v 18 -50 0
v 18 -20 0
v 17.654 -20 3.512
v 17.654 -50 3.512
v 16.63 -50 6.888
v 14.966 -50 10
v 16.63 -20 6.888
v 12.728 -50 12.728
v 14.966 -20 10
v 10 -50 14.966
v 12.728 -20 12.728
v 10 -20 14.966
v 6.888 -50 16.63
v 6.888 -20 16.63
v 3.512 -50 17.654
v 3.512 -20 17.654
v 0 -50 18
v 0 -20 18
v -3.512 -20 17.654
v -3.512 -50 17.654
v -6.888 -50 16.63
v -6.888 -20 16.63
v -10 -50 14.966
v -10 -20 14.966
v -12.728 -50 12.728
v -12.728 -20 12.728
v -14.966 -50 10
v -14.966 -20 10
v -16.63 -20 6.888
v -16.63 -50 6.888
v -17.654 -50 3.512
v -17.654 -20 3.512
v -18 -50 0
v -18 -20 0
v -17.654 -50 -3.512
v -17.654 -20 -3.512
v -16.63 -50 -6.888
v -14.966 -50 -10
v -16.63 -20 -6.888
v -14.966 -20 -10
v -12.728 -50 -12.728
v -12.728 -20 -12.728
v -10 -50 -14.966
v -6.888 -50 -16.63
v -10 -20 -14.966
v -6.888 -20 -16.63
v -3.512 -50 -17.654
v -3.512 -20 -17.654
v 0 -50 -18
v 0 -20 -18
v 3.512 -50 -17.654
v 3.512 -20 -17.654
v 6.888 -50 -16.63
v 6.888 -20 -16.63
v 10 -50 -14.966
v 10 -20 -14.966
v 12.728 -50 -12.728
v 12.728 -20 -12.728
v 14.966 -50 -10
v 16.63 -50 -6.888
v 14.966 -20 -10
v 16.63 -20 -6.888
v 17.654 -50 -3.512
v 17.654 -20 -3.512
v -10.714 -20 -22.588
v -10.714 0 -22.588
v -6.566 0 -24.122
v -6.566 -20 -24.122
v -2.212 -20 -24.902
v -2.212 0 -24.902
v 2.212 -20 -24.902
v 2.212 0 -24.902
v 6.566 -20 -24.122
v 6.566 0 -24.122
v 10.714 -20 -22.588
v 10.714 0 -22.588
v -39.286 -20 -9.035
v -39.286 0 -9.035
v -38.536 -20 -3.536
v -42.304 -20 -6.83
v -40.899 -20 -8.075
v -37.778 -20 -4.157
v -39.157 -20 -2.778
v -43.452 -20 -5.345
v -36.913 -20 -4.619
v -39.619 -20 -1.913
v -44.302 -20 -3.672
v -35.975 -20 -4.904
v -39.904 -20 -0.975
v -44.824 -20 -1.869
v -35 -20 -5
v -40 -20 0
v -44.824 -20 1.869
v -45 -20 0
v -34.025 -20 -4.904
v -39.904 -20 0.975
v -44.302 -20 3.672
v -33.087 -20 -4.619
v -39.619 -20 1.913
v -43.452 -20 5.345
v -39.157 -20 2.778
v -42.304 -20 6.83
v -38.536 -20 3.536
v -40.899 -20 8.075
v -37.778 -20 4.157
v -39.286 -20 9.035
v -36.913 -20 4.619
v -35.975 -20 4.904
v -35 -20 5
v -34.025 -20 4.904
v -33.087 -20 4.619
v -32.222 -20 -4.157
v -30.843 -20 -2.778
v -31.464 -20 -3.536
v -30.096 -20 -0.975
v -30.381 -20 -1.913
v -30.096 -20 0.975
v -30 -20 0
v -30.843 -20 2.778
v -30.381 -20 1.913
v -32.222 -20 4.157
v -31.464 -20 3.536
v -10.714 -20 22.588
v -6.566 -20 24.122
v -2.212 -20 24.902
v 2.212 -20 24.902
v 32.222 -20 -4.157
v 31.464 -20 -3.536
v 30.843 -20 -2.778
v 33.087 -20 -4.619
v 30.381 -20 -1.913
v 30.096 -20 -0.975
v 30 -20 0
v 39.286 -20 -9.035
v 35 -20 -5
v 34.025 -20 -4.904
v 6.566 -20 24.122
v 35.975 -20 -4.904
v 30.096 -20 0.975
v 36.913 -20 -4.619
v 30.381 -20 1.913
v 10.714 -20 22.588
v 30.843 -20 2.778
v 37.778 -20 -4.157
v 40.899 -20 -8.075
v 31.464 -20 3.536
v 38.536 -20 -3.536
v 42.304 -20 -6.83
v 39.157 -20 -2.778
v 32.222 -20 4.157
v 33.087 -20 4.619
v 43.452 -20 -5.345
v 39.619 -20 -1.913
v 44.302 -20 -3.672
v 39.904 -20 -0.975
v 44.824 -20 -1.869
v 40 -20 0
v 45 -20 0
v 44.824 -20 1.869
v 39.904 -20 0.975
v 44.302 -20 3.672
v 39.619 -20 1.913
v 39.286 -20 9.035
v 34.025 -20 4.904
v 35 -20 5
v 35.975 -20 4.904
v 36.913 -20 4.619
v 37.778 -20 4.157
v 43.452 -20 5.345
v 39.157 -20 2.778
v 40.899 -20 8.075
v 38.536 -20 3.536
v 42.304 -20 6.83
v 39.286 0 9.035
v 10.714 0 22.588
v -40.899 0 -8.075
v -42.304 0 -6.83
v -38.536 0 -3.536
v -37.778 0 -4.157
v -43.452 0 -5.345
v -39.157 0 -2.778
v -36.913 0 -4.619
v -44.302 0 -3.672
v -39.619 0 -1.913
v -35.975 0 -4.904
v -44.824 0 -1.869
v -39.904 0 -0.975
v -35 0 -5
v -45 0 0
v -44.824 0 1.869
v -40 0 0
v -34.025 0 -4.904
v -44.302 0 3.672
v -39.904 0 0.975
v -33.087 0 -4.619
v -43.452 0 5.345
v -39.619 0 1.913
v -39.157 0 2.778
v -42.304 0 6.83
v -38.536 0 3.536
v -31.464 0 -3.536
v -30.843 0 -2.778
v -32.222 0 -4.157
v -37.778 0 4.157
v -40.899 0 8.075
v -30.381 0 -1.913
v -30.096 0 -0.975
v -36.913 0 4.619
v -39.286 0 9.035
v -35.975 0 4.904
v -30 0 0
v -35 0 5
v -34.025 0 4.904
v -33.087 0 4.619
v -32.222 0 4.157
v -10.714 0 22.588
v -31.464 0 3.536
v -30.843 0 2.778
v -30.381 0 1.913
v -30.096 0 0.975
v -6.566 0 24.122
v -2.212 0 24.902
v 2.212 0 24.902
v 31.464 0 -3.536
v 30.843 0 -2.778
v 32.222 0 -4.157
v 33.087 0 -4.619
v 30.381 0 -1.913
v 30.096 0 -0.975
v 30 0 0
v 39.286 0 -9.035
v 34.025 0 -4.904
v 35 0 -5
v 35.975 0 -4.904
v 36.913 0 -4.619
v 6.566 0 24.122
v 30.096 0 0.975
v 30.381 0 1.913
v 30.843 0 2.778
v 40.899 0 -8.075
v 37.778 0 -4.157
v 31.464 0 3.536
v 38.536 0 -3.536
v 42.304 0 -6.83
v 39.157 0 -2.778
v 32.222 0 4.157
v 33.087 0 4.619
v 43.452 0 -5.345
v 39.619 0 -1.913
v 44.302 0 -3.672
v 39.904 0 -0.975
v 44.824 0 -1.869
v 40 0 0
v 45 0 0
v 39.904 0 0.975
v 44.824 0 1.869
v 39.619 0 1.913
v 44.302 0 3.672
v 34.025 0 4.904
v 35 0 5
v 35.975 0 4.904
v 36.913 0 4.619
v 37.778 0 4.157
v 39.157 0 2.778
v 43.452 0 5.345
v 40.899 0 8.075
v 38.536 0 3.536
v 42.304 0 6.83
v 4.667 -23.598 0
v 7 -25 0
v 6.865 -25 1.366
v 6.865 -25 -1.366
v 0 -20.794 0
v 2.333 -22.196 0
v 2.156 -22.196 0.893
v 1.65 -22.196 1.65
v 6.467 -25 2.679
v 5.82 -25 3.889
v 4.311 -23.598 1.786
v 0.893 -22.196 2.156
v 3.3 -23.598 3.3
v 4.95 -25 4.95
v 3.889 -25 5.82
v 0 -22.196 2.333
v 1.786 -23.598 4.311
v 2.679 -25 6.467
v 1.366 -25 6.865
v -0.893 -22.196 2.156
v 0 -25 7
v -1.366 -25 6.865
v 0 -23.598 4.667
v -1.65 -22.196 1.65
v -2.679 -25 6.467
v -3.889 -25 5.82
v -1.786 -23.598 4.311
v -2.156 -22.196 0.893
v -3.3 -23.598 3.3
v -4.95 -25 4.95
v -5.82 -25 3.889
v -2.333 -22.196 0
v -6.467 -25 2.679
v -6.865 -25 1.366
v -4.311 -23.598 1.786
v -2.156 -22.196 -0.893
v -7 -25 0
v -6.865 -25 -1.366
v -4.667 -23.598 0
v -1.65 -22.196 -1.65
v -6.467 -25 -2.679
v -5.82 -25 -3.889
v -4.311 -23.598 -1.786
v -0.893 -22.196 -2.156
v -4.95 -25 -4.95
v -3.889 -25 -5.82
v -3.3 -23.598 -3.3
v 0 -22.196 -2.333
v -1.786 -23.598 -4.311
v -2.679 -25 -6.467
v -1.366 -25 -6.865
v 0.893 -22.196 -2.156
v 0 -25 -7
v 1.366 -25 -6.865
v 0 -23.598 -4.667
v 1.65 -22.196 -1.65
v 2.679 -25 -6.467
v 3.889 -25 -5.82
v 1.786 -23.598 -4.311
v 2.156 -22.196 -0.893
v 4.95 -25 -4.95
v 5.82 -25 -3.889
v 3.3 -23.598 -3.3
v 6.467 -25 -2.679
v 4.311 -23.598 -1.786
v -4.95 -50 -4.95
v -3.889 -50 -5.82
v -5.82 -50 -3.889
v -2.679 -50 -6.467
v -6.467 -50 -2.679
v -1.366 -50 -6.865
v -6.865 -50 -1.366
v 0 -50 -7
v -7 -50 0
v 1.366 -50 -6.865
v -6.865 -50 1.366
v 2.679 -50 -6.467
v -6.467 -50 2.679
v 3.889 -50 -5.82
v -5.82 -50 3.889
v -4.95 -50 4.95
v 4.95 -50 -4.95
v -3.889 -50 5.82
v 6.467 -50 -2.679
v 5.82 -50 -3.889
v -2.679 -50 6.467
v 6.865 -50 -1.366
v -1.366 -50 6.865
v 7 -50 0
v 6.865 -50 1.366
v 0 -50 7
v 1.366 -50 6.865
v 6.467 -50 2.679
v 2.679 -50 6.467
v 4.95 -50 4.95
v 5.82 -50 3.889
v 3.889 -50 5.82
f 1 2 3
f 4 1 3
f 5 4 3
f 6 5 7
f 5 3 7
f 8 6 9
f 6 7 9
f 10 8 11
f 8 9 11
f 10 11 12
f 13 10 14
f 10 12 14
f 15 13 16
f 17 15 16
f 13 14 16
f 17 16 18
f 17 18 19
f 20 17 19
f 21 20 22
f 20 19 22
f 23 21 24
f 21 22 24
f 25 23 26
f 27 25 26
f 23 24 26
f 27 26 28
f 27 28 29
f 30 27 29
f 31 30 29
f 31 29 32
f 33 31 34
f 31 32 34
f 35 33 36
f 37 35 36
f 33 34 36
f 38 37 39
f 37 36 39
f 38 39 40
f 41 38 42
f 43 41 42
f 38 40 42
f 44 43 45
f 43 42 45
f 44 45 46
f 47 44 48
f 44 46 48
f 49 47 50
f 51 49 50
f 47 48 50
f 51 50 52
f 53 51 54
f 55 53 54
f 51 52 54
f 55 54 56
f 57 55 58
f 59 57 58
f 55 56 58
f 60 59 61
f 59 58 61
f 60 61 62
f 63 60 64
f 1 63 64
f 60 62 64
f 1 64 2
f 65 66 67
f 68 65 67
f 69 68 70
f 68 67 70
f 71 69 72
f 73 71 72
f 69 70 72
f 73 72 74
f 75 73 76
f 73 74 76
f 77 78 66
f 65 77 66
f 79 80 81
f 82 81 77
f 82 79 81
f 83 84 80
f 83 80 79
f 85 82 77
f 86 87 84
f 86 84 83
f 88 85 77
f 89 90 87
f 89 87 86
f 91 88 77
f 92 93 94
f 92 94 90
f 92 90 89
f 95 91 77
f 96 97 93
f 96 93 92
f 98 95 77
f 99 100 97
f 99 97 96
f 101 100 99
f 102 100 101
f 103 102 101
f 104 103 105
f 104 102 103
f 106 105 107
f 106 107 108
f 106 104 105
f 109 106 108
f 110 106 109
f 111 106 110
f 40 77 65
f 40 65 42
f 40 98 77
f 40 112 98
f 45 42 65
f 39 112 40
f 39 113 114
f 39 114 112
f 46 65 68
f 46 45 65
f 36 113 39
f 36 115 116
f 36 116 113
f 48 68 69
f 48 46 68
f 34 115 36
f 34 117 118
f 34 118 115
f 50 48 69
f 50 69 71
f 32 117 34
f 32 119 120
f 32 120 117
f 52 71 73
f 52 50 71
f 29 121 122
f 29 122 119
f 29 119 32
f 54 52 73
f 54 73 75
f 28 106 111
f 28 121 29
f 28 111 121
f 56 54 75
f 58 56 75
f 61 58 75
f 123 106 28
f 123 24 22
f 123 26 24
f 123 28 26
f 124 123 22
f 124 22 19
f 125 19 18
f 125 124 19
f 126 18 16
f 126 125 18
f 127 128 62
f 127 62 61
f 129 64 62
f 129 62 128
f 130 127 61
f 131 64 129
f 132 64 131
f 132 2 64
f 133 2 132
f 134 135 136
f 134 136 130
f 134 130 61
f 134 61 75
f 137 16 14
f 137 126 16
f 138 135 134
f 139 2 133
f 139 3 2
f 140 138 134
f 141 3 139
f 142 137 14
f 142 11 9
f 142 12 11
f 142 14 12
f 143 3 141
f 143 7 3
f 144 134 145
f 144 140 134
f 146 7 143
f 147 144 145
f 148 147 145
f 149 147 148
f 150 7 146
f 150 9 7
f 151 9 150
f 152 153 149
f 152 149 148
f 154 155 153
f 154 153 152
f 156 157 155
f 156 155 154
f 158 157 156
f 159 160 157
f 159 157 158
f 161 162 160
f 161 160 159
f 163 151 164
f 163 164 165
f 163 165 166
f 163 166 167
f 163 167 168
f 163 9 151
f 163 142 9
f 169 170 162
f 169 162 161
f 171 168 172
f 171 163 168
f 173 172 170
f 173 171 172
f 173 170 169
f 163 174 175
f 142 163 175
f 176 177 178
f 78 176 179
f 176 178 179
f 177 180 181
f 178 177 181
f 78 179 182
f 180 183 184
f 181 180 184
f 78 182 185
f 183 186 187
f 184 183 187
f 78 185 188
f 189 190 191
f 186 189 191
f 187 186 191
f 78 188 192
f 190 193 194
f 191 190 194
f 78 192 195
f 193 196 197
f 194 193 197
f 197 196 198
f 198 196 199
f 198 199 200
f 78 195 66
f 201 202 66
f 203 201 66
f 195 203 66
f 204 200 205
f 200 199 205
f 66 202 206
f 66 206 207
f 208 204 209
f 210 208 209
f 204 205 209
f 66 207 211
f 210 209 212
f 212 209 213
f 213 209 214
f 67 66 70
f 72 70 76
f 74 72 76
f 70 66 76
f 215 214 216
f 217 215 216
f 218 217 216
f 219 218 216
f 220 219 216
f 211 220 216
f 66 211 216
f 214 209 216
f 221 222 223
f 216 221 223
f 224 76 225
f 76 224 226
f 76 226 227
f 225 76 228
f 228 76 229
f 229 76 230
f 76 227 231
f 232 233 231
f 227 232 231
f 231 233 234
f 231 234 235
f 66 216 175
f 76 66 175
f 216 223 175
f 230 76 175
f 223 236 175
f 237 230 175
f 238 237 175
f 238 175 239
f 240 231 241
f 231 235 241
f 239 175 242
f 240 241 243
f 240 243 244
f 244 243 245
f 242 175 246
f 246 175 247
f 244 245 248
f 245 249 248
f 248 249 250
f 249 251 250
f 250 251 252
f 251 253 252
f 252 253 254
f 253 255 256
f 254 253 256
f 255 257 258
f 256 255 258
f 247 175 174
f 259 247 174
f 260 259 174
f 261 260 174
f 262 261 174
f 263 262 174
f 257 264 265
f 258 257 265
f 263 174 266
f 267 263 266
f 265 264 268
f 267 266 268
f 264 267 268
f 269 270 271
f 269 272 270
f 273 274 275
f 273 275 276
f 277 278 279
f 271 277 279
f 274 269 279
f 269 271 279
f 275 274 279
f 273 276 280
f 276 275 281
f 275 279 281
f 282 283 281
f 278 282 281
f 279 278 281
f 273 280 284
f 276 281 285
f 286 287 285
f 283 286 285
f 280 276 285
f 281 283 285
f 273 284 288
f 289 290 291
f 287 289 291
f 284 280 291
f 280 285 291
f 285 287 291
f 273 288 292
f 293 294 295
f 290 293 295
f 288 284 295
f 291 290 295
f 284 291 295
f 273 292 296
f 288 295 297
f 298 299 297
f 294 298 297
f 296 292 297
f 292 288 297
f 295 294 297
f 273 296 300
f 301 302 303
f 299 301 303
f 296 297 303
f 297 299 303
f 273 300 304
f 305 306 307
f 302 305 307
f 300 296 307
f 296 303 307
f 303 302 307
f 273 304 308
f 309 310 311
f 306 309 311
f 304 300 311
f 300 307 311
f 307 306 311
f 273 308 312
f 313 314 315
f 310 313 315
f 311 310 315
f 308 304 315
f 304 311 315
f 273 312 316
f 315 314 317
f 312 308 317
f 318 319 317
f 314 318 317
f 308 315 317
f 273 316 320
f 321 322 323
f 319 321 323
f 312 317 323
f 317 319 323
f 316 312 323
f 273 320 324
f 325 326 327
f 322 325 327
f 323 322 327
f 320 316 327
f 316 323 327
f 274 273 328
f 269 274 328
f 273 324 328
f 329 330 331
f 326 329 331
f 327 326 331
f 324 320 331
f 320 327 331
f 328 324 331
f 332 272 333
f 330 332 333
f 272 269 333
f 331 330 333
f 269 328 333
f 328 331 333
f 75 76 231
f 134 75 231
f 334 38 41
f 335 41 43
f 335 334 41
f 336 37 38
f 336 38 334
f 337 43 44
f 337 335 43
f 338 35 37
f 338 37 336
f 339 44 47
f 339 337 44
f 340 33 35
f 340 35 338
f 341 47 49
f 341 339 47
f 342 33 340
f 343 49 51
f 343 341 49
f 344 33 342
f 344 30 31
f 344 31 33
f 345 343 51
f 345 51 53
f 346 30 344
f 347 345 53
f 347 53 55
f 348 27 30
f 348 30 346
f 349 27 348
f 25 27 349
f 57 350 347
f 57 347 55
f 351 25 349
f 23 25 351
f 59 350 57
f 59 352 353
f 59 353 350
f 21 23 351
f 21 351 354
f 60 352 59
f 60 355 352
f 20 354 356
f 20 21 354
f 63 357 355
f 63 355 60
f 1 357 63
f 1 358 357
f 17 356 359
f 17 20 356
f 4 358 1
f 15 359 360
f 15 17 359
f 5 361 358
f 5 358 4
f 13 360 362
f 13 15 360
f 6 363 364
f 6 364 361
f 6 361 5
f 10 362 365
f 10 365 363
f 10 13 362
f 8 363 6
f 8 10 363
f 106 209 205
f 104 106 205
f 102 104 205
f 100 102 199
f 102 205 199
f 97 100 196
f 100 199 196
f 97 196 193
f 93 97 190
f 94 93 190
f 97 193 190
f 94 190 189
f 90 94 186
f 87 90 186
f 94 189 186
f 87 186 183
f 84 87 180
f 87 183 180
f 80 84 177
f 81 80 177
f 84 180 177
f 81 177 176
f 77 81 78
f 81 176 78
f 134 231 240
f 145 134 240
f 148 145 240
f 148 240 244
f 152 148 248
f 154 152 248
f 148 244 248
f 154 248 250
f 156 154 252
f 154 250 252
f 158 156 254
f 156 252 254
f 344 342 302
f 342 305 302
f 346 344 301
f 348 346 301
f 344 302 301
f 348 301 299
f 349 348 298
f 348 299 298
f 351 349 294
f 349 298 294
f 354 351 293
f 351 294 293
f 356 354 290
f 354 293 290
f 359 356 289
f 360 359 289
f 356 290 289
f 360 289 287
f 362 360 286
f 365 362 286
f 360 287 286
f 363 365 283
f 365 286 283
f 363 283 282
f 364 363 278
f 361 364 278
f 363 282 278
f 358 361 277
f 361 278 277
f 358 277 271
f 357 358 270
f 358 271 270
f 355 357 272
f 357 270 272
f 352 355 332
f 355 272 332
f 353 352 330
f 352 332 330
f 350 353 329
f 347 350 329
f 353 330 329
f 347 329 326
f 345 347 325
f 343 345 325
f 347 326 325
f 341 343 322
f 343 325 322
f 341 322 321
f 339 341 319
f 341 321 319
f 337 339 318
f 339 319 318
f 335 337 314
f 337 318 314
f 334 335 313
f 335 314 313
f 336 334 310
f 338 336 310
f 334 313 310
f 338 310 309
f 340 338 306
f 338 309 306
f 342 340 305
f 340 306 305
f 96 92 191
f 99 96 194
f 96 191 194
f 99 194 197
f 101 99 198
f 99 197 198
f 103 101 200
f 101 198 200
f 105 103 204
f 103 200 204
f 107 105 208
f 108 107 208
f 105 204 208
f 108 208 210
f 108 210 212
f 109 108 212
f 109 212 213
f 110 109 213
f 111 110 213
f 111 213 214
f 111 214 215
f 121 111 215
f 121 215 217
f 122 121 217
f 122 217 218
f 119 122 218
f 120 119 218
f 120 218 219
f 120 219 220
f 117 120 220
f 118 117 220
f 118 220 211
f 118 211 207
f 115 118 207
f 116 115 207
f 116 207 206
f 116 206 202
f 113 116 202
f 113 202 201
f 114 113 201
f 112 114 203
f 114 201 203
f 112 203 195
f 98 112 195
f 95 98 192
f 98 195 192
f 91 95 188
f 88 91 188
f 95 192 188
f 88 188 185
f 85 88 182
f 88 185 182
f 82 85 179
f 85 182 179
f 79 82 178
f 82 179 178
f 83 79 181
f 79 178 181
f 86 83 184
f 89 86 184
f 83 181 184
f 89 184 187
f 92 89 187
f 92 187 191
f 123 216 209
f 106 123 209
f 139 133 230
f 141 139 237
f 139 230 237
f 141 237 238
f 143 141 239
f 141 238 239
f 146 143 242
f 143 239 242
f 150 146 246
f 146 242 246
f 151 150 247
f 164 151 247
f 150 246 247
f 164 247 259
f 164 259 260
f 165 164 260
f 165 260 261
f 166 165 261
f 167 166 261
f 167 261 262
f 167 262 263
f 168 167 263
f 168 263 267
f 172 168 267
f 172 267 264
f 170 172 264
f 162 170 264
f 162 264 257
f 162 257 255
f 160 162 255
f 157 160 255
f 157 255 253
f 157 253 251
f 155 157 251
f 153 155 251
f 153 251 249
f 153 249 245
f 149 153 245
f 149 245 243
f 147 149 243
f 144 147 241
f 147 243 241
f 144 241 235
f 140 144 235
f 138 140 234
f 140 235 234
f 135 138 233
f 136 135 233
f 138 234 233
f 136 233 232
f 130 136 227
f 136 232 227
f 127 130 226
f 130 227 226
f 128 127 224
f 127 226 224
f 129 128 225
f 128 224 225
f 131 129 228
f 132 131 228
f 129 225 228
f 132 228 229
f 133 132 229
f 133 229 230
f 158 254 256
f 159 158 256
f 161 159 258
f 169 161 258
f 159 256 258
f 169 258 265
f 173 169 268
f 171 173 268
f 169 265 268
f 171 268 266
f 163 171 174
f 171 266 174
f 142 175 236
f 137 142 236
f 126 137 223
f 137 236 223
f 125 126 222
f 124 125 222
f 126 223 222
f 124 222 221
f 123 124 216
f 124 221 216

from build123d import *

# Parameters (mm, degrees)
F1_DEPTH = 20
F3_D     = 10
F2_R     = 18
F4_DEPTH = 30
F6_D     = 14
F6_DEPTH = 25
F6_TIP   = 4.2060243332


with BuildPart() as f1:
    # F0 (on Front) → F1 (new body)
    with BuildSketch(Plane.XZ):
        with BuildLine():
            ThreePointArc((-25, 0), (-21.1288563682, 13.3630620956), (-10.7142857143, 22.5876975726))
            Line((-10.7142857143, 22.5876975726), (-39.2857142857, 9.0350790291))
            ThreePointArc((-39.2857142857, 9.0350790291), (-29.6547751618, 8.4515425473), (-25, 0))
        make_face()
        with BuildLine():
            ThreePointArc((39.2857142857, -9.0350790291), (29.6547751618, -8.4515425473), (25, 0))
            ThreePointArc((25, 0), (21.1288563682, -13.3630620956), (10.7142857143, -22.5876975726))
            Line((10.7142857143, -22.5876975726), (39.2857142857, -9.0350790291))
        make_face()
        with BuildLine():
            Line((-39.2857142857, -9.0350790291), (-10.7142857143, -22.5876975726))
            ThreePointArc((-10.7142857143, -22.5876975726), (-21.1288563682, -13.3630620956), (-25, 0))
            ThreePointArc((-25, 0), (-29.6547751618, -8.4515425473), (-39.2857142857, -9.0350790291))
        make_face()
        with BuildLine():
            ThreePointArc((10.7142857143, -22.5876975726), (21.1288563682, -13.3630620956), (25, 0))
            ThreePointArc((25, 0), (21.1288563682, 13.3630620956), (10.7142857143, 22.5876975726))
            ThreePointArc((10.7142857143, 22.5876975726), (0, 25), (-10.7142857143, 22.5876975726))
            ThreePointArc((-10.7142857143, 22.5876975726), (-21.1288563682, 13.3630620956), (-25, 0))
            ThreePointArc((-25, 0), (-21.1288563682, -13.3630620956), (-10.7142857143, -22.5876975726))
            ThreePointArc((-10.7142857143, -22.5876975726), (0, -25), (10.7142857143, -22.5876975726))
        make_face()
        with BuildLine():
            ThreePointArc((-39.2857142857, -9.0350790291), (-29.6547751618, -8.4515425473), (-25, 0))
            ThreePointArc((-25, 0), (-29.6547751618, 8.4515425473), (-39.2857142857, 9.0350790291))
            ThreePointArc((-39.2857142857, 9.0350790291), (-45, 0), (-39.2857142857, -9.0350790291))
        make_face()
        with BuildLine():
            ThreePointArc((39.2857142857, 9.0350790291), (29.6547751618, 8.4515425473), (25, 0))
            ThreePointArc((25, 0), (29.6547751618, -8.4515425473), (39.2857142857, -9.0350790291))
            ThreePointArc((39.2857142857, -9.0350790291), (43.4515425473, -5.3452248382), (45, 0))
            ThreePointArc((45, 0), (43.4515425473, 5.3452248382), (39.2857142857, 9.0350790291))
        make_face()
        with BuildLine():
            ThreePointArc((10.7142857143, 22.5876975726), (21.1288563682, 13.3630620956), (25, 0))
            ThreePointArc((25, 0), (29.6547751618, 8.4515425473), (39.2857142857, 9.0350790291))
            Line((39.2857142857, 9.0350790291), (10.7142857143, 22.5876975726))
        make_face()
    extrude(amount=F1_DEPTH)

    # F3 (through all)
    with Locations(Plane.XZ.offset(20)):
        with Locations((-35, 0), (35, 0)):
            Hole(F3_D / 2)

    # F2 (on face) → F4 (join)
    with BuildSketch(Plane.XZ.offset(20)):
        Circle(F2_R)
    extrude(amount=F4_DEPTH)

    # F6
    with Locations(Plane.XZ.offset(50)):
        with Locations((0, 0)):
            Hole(F6_D / 2, depth=F6_DEPTH)
            with Locations((0, 0, -(F6_DEPTH + F6_TIP / 2))):  # 118° drill point
                Cone(0, F6_D / 2, F6_TIP, mode=Mode.SUBTRACT)


solid = f1.part
